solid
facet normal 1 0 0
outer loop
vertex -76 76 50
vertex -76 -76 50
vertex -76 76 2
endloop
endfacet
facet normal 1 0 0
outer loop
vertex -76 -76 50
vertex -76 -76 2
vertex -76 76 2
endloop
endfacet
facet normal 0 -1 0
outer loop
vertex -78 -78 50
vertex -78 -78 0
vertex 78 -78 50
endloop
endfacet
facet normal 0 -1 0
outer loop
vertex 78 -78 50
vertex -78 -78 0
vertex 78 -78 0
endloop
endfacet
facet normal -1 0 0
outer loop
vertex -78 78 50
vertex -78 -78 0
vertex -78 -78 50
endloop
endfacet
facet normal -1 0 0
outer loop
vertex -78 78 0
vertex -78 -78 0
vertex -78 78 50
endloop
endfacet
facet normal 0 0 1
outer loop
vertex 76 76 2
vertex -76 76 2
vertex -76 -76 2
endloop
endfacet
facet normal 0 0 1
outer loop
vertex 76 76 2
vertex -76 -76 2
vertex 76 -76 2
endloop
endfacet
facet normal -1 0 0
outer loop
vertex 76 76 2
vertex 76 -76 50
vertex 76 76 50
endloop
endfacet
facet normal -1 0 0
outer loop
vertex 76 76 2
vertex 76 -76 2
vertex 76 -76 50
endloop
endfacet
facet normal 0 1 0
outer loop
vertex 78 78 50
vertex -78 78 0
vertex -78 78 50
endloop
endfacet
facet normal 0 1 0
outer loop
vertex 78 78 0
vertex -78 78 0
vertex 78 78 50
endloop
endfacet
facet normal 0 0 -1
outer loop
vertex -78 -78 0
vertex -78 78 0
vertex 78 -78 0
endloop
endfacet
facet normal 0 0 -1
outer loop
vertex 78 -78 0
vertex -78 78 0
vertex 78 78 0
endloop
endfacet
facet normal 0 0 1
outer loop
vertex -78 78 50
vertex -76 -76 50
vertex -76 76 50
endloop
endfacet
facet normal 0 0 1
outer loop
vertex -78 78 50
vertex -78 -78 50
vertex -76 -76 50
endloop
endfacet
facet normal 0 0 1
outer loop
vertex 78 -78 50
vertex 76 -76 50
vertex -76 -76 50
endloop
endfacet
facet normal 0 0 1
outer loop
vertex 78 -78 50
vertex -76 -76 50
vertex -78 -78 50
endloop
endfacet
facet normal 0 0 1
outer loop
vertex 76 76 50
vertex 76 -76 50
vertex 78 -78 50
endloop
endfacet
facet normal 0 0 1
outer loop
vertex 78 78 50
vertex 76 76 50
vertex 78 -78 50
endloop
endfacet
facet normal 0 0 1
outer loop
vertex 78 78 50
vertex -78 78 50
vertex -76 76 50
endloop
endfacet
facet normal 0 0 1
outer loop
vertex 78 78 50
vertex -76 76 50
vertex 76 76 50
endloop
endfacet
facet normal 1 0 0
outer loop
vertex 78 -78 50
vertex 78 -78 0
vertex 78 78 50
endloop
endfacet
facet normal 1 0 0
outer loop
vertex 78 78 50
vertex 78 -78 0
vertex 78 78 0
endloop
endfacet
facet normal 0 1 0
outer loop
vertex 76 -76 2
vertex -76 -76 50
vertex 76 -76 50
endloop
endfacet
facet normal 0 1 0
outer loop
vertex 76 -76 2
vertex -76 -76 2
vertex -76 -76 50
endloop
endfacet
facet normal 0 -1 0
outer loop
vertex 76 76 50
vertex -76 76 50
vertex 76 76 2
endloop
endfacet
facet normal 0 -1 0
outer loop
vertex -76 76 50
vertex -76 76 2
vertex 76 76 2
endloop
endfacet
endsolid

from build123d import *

# Parameters (mm, degrees)
SKETCH_W    = 156
SKETCH_H    = 156
PAD_DEPTH   = 50
THICKNESS_T = -2


with BuildPart() as part:
    # Sketch → Pad (new body)
    with BuildSketch(Plane.XY):
        Rectangle(SKETCH_W, SKETCH_H)
    extrude(amount=PAD_DEPTH)

    # Thickness
    thickness_openings = [part.faces().sort_by_distance(p)[0] for p in [
        (0, 0, 50),
    ]]
    offset(amount=THICKNESS_T, openings=thickness_openings)


solid = part.part
